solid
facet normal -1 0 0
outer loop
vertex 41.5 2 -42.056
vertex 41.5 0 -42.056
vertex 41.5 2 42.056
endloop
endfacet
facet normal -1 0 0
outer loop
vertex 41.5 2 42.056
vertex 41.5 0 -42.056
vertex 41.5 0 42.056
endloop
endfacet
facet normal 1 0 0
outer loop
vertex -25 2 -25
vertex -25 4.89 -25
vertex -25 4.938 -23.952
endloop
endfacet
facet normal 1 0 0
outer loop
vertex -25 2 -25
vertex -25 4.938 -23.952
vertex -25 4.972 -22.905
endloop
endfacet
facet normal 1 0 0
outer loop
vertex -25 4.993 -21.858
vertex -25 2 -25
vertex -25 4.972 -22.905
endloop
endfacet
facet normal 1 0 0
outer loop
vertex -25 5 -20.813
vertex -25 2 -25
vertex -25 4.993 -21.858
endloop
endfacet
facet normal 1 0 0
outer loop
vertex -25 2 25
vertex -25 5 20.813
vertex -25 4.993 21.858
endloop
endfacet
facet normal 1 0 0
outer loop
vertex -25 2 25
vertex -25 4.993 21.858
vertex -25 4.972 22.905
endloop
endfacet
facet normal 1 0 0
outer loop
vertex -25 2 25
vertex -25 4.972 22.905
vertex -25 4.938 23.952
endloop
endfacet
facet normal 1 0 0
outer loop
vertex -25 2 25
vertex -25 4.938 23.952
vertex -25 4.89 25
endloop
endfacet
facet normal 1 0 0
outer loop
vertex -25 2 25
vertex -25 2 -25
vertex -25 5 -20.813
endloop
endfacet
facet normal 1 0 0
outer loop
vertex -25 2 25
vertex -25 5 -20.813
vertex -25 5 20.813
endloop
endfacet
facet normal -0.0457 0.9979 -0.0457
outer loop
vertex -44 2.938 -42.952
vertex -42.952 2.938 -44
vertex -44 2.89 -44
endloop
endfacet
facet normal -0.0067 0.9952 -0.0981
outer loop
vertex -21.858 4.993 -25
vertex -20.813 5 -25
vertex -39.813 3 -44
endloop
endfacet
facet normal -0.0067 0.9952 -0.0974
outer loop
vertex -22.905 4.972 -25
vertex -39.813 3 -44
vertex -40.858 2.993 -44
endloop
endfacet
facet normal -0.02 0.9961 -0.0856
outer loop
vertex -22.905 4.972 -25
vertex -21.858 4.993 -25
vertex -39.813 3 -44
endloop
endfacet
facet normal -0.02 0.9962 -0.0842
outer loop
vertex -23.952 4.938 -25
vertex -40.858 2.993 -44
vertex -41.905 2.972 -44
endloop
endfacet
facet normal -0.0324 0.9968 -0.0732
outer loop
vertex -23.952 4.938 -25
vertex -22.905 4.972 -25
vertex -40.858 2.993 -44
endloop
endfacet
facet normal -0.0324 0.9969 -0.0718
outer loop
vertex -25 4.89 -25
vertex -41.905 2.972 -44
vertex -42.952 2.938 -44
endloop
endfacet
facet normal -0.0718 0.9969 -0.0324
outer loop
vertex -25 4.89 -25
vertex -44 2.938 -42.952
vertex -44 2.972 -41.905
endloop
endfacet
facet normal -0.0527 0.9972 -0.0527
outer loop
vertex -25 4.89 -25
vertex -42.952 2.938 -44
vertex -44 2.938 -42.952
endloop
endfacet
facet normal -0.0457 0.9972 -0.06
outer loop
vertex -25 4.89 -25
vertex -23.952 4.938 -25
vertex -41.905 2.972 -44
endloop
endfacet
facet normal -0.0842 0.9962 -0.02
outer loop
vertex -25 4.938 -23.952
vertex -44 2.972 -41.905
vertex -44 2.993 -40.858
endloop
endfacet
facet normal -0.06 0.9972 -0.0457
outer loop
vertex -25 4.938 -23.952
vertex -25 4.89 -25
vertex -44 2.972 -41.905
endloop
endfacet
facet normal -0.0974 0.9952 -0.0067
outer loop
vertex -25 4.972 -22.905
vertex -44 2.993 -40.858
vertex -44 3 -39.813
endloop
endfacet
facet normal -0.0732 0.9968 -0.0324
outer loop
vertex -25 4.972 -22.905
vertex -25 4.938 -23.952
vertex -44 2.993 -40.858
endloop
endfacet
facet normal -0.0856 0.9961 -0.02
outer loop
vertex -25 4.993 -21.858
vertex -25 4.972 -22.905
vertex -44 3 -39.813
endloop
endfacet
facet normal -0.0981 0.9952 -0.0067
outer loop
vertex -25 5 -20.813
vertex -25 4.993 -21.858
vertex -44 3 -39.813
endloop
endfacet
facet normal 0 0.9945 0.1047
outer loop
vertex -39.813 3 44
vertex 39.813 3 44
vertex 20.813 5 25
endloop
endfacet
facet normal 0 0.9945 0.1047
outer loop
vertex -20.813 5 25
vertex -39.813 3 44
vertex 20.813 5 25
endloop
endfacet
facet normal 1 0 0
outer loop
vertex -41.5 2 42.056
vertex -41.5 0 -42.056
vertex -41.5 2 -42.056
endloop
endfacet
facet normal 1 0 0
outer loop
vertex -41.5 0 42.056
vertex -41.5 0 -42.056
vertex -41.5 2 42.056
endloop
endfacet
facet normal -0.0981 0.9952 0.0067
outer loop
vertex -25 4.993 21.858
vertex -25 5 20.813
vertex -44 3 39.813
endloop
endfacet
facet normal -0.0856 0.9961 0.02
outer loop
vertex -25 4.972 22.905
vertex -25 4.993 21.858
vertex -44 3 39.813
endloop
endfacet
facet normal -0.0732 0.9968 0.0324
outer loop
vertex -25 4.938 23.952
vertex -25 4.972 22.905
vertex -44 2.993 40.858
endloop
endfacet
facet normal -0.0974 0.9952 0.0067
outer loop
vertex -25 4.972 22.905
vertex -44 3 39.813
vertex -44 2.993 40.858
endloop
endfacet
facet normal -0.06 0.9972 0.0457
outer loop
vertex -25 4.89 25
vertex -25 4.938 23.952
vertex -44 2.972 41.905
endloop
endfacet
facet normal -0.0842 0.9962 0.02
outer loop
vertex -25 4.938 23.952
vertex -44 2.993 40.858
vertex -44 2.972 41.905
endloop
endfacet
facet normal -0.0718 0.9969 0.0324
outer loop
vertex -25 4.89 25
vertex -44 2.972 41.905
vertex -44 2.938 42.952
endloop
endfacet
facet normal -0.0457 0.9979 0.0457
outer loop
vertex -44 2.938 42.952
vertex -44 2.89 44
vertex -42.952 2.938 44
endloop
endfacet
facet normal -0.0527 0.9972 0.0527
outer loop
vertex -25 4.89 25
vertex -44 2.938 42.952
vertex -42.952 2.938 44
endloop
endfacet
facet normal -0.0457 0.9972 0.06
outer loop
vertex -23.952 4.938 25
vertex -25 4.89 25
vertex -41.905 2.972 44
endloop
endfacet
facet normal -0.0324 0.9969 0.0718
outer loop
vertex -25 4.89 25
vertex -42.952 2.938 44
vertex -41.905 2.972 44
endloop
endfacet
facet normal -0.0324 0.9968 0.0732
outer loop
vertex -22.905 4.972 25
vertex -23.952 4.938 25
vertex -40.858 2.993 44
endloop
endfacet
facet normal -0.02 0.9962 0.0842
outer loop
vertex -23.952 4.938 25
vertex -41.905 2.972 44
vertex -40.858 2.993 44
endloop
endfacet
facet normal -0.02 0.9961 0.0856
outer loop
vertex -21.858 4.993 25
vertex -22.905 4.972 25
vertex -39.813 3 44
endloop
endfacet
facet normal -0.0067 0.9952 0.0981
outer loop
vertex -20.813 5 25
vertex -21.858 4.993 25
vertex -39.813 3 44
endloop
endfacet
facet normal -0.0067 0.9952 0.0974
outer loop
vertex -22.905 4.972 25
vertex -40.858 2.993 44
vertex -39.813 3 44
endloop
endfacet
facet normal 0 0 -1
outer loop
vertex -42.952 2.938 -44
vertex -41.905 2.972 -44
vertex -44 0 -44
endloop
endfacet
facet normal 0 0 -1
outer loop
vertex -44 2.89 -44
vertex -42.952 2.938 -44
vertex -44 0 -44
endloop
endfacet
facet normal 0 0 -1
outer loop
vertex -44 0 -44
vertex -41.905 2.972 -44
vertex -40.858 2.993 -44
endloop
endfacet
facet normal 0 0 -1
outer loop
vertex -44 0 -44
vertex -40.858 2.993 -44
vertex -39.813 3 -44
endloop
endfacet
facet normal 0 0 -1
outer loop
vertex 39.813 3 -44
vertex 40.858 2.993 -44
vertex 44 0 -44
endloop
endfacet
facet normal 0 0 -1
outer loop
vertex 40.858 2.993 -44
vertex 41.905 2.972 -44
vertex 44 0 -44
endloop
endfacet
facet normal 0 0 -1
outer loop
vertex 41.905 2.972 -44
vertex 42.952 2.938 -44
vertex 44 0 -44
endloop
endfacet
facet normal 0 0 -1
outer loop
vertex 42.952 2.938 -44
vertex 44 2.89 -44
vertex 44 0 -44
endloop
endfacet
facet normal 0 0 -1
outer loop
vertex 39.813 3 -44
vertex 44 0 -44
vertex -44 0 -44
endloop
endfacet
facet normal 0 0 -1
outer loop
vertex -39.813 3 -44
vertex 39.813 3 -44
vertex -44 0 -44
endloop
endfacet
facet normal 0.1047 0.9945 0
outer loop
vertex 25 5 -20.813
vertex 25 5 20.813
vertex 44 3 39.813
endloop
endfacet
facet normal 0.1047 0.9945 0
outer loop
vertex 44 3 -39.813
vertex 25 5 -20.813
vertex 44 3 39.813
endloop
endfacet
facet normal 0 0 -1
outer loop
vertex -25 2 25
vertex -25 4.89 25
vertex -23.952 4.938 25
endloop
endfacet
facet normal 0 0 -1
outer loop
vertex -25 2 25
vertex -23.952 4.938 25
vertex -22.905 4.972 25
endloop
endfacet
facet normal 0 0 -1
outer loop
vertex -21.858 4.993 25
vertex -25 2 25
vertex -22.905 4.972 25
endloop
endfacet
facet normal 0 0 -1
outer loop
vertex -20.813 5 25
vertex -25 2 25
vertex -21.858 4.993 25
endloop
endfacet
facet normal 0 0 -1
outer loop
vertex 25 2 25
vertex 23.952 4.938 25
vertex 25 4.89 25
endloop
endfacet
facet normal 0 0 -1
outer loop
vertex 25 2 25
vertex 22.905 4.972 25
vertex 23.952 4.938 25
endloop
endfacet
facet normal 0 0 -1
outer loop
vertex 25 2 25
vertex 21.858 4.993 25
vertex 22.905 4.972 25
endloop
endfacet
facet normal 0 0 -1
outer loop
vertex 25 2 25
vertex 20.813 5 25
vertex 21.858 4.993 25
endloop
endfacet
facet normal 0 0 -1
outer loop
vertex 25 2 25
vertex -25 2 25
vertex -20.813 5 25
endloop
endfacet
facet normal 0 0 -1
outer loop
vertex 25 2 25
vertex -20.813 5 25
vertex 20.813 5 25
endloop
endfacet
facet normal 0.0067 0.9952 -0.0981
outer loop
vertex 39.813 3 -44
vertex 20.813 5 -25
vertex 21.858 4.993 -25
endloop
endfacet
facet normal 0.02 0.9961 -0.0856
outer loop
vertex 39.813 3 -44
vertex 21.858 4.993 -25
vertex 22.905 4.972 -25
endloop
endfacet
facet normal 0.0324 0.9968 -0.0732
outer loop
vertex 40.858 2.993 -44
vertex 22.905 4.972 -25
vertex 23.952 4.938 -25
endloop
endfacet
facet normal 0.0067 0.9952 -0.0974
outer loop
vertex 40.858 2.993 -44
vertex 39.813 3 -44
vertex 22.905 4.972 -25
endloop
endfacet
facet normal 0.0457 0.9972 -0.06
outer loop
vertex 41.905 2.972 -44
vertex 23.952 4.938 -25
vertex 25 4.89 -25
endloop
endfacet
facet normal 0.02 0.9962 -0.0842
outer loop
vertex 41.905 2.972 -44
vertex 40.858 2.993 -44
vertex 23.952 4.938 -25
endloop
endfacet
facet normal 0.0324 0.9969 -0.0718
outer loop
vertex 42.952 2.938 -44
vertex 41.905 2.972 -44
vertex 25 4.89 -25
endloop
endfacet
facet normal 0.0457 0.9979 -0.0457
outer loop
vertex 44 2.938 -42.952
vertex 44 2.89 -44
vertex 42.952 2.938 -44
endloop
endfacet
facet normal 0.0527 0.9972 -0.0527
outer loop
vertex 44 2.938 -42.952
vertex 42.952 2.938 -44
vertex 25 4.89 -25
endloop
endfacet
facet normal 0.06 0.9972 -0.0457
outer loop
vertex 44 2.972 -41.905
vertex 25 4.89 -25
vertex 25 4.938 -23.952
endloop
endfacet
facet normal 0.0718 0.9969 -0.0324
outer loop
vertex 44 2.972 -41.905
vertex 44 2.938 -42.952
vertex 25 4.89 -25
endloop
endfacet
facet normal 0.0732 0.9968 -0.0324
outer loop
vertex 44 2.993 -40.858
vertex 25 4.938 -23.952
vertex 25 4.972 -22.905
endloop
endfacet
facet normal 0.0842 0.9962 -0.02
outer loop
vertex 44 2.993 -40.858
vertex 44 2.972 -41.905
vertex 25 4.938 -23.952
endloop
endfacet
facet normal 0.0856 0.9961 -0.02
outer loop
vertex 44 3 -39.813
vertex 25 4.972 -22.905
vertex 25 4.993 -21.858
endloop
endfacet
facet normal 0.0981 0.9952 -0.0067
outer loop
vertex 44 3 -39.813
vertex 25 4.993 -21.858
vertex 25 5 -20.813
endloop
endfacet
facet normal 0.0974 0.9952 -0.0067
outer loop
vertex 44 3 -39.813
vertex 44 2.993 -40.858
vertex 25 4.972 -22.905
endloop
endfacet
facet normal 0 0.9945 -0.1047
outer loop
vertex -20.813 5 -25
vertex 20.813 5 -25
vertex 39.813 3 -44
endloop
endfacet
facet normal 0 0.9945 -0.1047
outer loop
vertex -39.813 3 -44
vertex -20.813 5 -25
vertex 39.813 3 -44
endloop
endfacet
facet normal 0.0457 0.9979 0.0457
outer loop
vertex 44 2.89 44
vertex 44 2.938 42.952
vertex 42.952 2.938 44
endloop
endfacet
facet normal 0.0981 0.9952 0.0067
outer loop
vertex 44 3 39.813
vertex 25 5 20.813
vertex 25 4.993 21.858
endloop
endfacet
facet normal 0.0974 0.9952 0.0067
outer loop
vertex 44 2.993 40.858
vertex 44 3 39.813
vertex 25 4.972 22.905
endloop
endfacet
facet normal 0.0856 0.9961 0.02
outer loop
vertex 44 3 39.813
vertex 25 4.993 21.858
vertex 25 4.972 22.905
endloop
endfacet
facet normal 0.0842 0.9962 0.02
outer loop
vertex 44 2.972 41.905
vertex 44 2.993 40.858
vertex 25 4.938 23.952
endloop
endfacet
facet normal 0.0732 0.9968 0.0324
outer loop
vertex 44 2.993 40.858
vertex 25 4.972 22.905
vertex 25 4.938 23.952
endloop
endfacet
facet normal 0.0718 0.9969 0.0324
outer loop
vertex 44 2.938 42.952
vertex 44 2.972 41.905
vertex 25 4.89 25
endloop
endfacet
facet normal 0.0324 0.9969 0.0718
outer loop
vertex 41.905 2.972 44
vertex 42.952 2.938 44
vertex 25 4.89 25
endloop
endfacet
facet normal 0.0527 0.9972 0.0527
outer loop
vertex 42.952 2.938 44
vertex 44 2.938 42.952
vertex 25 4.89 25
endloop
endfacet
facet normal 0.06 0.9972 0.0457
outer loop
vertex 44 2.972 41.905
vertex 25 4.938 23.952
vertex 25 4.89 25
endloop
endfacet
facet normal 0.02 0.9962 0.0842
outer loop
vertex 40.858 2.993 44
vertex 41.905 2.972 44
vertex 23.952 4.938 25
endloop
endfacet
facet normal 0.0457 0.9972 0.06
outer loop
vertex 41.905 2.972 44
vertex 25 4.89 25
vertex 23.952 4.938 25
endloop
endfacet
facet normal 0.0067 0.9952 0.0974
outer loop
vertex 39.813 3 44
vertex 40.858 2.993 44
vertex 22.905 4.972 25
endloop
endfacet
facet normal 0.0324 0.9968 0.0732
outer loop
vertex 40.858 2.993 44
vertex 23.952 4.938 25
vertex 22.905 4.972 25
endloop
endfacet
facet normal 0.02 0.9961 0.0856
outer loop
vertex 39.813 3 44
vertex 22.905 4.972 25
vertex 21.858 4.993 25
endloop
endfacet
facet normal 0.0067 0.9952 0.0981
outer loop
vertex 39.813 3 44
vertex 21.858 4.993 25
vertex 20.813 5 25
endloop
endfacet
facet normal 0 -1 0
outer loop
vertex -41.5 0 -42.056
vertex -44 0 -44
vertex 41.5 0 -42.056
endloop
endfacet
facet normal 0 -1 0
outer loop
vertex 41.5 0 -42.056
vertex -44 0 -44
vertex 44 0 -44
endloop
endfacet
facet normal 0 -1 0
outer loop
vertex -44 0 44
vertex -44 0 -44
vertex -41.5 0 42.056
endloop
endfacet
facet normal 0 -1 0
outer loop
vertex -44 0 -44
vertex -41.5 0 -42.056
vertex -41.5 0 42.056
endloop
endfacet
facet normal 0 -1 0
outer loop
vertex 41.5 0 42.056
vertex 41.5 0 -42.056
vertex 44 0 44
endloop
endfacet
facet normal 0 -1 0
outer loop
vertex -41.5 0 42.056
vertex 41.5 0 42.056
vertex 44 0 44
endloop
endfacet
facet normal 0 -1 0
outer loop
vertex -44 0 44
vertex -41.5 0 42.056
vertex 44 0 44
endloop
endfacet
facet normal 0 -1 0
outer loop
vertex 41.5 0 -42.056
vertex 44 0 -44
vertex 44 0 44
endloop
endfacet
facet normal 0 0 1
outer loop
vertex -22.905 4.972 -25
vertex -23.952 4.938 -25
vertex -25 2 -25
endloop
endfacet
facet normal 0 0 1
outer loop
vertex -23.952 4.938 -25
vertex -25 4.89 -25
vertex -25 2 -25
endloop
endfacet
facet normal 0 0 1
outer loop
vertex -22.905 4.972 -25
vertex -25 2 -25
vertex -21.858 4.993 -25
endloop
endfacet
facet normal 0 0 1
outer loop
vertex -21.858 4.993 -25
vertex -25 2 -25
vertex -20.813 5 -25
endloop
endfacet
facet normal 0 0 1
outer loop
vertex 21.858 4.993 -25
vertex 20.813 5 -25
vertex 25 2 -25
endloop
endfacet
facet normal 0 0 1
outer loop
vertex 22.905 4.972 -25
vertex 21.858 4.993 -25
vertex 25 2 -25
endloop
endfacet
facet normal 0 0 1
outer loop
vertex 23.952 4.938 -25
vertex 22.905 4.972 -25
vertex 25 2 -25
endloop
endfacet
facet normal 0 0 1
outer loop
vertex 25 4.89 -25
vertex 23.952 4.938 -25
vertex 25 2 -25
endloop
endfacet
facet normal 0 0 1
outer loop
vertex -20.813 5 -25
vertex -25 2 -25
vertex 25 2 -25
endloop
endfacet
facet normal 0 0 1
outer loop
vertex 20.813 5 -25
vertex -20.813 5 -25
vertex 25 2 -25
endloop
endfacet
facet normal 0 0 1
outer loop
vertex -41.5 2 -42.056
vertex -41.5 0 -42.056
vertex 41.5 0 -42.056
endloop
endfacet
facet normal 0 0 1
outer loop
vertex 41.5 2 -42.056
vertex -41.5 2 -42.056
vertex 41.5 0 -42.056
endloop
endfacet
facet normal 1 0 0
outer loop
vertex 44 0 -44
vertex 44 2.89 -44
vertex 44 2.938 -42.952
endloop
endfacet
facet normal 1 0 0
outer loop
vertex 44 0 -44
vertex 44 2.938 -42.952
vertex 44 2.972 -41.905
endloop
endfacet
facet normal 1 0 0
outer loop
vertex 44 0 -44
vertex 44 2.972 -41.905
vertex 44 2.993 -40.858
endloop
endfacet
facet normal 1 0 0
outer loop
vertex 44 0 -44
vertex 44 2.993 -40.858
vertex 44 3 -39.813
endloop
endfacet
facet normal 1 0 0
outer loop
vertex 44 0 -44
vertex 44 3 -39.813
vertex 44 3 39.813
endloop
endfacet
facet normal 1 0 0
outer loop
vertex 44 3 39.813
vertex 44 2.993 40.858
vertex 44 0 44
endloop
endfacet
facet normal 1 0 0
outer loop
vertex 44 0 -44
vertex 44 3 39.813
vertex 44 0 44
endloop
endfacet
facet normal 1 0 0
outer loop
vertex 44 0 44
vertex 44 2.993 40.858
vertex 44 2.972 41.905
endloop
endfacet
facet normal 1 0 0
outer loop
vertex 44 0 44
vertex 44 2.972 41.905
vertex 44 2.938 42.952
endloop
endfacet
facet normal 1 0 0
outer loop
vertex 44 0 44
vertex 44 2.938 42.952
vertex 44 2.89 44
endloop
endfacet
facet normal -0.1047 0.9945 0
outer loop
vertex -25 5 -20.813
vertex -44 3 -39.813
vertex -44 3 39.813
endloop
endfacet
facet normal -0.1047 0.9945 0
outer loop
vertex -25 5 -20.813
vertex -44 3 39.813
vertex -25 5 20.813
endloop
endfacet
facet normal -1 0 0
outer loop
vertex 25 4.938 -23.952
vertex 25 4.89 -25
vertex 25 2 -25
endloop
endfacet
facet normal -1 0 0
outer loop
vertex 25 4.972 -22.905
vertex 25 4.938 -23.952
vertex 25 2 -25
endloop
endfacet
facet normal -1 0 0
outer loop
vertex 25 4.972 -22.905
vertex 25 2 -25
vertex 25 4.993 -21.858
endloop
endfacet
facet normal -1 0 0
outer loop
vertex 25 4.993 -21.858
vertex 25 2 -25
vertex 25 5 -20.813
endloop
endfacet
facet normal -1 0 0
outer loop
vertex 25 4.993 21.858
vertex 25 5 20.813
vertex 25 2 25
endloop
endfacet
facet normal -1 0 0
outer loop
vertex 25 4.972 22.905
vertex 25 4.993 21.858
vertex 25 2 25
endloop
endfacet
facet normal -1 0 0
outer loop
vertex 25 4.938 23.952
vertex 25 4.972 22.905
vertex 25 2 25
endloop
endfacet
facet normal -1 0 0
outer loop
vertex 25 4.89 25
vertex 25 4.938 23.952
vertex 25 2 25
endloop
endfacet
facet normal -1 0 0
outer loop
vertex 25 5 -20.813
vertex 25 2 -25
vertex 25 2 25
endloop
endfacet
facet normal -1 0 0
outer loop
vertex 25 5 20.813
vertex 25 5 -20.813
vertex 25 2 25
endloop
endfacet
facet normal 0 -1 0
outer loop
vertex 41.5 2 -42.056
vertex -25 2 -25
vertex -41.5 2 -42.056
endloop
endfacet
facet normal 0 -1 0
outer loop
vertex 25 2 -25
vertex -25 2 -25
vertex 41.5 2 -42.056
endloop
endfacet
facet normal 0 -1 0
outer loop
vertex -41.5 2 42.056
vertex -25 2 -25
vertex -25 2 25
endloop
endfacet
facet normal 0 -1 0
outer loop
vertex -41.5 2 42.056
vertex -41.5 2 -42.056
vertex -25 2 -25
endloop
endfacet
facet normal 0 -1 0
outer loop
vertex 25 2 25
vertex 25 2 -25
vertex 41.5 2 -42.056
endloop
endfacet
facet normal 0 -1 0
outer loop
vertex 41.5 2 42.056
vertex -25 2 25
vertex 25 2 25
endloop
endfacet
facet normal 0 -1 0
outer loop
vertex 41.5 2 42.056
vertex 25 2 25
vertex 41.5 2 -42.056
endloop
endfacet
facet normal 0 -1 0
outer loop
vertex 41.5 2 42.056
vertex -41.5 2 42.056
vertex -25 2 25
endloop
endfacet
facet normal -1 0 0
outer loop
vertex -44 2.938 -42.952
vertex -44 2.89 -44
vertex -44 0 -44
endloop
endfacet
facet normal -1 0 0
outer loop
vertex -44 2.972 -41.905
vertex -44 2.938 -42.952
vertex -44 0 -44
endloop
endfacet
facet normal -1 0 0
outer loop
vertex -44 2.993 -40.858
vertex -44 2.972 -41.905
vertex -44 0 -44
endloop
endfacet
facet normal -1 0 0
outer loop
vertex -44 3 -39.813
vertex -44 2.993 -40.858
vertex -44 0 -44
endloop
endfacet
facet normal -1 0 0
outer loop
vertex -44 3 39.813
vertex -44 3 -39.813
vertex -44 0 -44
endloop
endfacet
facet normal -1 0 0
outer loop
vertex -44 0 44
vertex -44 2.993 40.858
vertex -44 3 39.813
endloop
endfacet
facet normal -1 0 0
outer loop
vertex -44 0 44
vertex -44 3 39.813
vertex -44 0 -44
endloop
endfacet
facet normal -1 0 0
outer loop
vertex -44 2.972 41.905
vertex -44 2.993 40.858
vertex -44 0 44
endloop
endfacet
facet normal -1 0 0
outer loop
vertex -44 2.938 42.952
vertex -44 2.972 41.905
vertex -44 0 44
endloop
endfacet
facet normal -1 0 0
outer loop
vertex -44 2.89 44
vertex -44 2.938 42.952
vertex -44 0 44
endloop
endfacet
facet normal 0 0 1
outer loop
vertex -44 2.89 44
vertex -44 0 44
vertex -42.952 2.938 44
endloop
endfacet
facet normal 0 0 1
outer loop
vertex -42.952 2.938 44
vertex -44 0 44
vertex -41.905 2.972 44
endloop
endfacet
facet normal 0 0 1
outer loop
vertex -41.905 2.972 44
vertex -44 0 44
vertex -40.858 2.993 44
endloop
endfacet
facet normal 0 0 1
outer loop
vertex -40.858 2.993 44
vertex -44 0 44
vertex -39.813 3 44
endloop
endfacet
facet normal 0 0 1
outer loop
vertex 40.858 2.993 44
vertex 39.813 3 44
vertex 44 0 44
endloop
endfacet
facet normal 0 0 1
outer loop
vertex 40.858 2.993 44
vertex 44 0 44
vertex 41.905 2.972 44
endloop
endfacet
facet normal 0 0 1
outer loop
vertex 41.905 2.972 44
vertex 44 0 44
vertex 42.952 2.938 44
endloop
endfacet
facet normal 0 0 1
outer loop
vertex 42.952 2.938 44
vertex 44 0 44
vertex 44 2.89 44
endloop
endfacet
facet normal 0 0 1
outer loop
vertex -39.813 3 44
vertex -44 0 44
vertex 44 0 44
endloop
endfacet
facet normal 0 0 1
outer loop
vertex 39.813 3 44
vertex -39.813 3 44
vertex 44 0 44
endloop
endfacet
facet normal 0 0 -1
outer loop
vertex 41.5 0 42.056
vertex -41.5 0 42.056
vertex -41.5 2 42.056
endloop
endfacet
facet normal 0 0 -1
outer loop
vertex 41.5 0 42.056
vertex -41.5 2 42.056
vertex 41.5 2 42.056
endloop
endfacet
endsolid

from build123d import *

# Parameters (mm, degrees)
EXTRUDE_1_DEPTH     = 44
SKETCH_2_OUTSIDE_W  = 114.91
SKETCH_2_OUTSIDE_H  = 31.91
CUT_EXTRUDE_1_DEPTH = 44
SKETCH_3_W          = 83
SKETCH_3_H          = 84.111264856
CUT_EXTRUDE_2_DEPTH = 2
SKETCH_5_W          = 50
SKETCH_5_H          = 50
CUT_EXTRUDE_3_DEPTH = 6
FILLET_1_R          = 40


with BuildPart() as part:
    # Эскиз1 → Бобышка-Вытянуть1 (new body, symmetric)
    with BuildSketch(Plane(origin=(0, 0, 0), x_dir=(0, 0, -1), z_dir=(1, 0, 0))):
        Polygon((44, 0), (-44, 0), (-44, 3), (-25, 5), (25, 5), (44, 3), align=None)
    extrude(amount=EXTRUDE_1_DEPTH, both=True)

    # Эскиз2 outside → Вырез-Вытянуть1 (cut, symmetric)
    with BuildSketch(Plane.XY):
        with Locations((0, 2.5)):
            Rectangle(SKETCH_2_OUTSIDE_W, SKETCH_2_OUTSIDE_H)
        Polygon((44, 0), (-44, 0), (-44, 3), (-25, 5), (25, 5), (44, 3), align=None, mode=Mode.SUBTRACT)
    extrude(amount=CUT_EXTRUDE_1_DEPTH, both=True, mode=Mode.SUBTRACT)

    # Эскиз3 → Вырез-Вытянуть2 (cut)
    with BuildSketch(Plane.XZ):
        Rectangle(SKETCH_3_W, SKETCH_3_H)
    extrude(amount=-CUT_EXTRUDE_2_DEPTH, mode=Mode.SUBTRACT)

    # Эскиз5 → Вырез-Вытянуть3 (cut, through all)
    with BuildSketch(Plane.XZ):
        Rectangle(SKETCH_5_W, SKETCH_5_H)
    extrude(amount=-CUT_EXTRUDE_3_DEPTH, mode=Mode.SUBTRACT)

    # Скругление1
    fillet_1_edges = [part.edges().sort_by_distance(p)[0] for p in [
        (34.5, 4, -34.5),
        (-34.5, 4, -34.5),
        (-34.5, 4, 34.5),
        (34.5, 4, 34.5),
    ]]
    fillet(fillet_1_edges, radius=FILLET_1_R)


solid = part.part
